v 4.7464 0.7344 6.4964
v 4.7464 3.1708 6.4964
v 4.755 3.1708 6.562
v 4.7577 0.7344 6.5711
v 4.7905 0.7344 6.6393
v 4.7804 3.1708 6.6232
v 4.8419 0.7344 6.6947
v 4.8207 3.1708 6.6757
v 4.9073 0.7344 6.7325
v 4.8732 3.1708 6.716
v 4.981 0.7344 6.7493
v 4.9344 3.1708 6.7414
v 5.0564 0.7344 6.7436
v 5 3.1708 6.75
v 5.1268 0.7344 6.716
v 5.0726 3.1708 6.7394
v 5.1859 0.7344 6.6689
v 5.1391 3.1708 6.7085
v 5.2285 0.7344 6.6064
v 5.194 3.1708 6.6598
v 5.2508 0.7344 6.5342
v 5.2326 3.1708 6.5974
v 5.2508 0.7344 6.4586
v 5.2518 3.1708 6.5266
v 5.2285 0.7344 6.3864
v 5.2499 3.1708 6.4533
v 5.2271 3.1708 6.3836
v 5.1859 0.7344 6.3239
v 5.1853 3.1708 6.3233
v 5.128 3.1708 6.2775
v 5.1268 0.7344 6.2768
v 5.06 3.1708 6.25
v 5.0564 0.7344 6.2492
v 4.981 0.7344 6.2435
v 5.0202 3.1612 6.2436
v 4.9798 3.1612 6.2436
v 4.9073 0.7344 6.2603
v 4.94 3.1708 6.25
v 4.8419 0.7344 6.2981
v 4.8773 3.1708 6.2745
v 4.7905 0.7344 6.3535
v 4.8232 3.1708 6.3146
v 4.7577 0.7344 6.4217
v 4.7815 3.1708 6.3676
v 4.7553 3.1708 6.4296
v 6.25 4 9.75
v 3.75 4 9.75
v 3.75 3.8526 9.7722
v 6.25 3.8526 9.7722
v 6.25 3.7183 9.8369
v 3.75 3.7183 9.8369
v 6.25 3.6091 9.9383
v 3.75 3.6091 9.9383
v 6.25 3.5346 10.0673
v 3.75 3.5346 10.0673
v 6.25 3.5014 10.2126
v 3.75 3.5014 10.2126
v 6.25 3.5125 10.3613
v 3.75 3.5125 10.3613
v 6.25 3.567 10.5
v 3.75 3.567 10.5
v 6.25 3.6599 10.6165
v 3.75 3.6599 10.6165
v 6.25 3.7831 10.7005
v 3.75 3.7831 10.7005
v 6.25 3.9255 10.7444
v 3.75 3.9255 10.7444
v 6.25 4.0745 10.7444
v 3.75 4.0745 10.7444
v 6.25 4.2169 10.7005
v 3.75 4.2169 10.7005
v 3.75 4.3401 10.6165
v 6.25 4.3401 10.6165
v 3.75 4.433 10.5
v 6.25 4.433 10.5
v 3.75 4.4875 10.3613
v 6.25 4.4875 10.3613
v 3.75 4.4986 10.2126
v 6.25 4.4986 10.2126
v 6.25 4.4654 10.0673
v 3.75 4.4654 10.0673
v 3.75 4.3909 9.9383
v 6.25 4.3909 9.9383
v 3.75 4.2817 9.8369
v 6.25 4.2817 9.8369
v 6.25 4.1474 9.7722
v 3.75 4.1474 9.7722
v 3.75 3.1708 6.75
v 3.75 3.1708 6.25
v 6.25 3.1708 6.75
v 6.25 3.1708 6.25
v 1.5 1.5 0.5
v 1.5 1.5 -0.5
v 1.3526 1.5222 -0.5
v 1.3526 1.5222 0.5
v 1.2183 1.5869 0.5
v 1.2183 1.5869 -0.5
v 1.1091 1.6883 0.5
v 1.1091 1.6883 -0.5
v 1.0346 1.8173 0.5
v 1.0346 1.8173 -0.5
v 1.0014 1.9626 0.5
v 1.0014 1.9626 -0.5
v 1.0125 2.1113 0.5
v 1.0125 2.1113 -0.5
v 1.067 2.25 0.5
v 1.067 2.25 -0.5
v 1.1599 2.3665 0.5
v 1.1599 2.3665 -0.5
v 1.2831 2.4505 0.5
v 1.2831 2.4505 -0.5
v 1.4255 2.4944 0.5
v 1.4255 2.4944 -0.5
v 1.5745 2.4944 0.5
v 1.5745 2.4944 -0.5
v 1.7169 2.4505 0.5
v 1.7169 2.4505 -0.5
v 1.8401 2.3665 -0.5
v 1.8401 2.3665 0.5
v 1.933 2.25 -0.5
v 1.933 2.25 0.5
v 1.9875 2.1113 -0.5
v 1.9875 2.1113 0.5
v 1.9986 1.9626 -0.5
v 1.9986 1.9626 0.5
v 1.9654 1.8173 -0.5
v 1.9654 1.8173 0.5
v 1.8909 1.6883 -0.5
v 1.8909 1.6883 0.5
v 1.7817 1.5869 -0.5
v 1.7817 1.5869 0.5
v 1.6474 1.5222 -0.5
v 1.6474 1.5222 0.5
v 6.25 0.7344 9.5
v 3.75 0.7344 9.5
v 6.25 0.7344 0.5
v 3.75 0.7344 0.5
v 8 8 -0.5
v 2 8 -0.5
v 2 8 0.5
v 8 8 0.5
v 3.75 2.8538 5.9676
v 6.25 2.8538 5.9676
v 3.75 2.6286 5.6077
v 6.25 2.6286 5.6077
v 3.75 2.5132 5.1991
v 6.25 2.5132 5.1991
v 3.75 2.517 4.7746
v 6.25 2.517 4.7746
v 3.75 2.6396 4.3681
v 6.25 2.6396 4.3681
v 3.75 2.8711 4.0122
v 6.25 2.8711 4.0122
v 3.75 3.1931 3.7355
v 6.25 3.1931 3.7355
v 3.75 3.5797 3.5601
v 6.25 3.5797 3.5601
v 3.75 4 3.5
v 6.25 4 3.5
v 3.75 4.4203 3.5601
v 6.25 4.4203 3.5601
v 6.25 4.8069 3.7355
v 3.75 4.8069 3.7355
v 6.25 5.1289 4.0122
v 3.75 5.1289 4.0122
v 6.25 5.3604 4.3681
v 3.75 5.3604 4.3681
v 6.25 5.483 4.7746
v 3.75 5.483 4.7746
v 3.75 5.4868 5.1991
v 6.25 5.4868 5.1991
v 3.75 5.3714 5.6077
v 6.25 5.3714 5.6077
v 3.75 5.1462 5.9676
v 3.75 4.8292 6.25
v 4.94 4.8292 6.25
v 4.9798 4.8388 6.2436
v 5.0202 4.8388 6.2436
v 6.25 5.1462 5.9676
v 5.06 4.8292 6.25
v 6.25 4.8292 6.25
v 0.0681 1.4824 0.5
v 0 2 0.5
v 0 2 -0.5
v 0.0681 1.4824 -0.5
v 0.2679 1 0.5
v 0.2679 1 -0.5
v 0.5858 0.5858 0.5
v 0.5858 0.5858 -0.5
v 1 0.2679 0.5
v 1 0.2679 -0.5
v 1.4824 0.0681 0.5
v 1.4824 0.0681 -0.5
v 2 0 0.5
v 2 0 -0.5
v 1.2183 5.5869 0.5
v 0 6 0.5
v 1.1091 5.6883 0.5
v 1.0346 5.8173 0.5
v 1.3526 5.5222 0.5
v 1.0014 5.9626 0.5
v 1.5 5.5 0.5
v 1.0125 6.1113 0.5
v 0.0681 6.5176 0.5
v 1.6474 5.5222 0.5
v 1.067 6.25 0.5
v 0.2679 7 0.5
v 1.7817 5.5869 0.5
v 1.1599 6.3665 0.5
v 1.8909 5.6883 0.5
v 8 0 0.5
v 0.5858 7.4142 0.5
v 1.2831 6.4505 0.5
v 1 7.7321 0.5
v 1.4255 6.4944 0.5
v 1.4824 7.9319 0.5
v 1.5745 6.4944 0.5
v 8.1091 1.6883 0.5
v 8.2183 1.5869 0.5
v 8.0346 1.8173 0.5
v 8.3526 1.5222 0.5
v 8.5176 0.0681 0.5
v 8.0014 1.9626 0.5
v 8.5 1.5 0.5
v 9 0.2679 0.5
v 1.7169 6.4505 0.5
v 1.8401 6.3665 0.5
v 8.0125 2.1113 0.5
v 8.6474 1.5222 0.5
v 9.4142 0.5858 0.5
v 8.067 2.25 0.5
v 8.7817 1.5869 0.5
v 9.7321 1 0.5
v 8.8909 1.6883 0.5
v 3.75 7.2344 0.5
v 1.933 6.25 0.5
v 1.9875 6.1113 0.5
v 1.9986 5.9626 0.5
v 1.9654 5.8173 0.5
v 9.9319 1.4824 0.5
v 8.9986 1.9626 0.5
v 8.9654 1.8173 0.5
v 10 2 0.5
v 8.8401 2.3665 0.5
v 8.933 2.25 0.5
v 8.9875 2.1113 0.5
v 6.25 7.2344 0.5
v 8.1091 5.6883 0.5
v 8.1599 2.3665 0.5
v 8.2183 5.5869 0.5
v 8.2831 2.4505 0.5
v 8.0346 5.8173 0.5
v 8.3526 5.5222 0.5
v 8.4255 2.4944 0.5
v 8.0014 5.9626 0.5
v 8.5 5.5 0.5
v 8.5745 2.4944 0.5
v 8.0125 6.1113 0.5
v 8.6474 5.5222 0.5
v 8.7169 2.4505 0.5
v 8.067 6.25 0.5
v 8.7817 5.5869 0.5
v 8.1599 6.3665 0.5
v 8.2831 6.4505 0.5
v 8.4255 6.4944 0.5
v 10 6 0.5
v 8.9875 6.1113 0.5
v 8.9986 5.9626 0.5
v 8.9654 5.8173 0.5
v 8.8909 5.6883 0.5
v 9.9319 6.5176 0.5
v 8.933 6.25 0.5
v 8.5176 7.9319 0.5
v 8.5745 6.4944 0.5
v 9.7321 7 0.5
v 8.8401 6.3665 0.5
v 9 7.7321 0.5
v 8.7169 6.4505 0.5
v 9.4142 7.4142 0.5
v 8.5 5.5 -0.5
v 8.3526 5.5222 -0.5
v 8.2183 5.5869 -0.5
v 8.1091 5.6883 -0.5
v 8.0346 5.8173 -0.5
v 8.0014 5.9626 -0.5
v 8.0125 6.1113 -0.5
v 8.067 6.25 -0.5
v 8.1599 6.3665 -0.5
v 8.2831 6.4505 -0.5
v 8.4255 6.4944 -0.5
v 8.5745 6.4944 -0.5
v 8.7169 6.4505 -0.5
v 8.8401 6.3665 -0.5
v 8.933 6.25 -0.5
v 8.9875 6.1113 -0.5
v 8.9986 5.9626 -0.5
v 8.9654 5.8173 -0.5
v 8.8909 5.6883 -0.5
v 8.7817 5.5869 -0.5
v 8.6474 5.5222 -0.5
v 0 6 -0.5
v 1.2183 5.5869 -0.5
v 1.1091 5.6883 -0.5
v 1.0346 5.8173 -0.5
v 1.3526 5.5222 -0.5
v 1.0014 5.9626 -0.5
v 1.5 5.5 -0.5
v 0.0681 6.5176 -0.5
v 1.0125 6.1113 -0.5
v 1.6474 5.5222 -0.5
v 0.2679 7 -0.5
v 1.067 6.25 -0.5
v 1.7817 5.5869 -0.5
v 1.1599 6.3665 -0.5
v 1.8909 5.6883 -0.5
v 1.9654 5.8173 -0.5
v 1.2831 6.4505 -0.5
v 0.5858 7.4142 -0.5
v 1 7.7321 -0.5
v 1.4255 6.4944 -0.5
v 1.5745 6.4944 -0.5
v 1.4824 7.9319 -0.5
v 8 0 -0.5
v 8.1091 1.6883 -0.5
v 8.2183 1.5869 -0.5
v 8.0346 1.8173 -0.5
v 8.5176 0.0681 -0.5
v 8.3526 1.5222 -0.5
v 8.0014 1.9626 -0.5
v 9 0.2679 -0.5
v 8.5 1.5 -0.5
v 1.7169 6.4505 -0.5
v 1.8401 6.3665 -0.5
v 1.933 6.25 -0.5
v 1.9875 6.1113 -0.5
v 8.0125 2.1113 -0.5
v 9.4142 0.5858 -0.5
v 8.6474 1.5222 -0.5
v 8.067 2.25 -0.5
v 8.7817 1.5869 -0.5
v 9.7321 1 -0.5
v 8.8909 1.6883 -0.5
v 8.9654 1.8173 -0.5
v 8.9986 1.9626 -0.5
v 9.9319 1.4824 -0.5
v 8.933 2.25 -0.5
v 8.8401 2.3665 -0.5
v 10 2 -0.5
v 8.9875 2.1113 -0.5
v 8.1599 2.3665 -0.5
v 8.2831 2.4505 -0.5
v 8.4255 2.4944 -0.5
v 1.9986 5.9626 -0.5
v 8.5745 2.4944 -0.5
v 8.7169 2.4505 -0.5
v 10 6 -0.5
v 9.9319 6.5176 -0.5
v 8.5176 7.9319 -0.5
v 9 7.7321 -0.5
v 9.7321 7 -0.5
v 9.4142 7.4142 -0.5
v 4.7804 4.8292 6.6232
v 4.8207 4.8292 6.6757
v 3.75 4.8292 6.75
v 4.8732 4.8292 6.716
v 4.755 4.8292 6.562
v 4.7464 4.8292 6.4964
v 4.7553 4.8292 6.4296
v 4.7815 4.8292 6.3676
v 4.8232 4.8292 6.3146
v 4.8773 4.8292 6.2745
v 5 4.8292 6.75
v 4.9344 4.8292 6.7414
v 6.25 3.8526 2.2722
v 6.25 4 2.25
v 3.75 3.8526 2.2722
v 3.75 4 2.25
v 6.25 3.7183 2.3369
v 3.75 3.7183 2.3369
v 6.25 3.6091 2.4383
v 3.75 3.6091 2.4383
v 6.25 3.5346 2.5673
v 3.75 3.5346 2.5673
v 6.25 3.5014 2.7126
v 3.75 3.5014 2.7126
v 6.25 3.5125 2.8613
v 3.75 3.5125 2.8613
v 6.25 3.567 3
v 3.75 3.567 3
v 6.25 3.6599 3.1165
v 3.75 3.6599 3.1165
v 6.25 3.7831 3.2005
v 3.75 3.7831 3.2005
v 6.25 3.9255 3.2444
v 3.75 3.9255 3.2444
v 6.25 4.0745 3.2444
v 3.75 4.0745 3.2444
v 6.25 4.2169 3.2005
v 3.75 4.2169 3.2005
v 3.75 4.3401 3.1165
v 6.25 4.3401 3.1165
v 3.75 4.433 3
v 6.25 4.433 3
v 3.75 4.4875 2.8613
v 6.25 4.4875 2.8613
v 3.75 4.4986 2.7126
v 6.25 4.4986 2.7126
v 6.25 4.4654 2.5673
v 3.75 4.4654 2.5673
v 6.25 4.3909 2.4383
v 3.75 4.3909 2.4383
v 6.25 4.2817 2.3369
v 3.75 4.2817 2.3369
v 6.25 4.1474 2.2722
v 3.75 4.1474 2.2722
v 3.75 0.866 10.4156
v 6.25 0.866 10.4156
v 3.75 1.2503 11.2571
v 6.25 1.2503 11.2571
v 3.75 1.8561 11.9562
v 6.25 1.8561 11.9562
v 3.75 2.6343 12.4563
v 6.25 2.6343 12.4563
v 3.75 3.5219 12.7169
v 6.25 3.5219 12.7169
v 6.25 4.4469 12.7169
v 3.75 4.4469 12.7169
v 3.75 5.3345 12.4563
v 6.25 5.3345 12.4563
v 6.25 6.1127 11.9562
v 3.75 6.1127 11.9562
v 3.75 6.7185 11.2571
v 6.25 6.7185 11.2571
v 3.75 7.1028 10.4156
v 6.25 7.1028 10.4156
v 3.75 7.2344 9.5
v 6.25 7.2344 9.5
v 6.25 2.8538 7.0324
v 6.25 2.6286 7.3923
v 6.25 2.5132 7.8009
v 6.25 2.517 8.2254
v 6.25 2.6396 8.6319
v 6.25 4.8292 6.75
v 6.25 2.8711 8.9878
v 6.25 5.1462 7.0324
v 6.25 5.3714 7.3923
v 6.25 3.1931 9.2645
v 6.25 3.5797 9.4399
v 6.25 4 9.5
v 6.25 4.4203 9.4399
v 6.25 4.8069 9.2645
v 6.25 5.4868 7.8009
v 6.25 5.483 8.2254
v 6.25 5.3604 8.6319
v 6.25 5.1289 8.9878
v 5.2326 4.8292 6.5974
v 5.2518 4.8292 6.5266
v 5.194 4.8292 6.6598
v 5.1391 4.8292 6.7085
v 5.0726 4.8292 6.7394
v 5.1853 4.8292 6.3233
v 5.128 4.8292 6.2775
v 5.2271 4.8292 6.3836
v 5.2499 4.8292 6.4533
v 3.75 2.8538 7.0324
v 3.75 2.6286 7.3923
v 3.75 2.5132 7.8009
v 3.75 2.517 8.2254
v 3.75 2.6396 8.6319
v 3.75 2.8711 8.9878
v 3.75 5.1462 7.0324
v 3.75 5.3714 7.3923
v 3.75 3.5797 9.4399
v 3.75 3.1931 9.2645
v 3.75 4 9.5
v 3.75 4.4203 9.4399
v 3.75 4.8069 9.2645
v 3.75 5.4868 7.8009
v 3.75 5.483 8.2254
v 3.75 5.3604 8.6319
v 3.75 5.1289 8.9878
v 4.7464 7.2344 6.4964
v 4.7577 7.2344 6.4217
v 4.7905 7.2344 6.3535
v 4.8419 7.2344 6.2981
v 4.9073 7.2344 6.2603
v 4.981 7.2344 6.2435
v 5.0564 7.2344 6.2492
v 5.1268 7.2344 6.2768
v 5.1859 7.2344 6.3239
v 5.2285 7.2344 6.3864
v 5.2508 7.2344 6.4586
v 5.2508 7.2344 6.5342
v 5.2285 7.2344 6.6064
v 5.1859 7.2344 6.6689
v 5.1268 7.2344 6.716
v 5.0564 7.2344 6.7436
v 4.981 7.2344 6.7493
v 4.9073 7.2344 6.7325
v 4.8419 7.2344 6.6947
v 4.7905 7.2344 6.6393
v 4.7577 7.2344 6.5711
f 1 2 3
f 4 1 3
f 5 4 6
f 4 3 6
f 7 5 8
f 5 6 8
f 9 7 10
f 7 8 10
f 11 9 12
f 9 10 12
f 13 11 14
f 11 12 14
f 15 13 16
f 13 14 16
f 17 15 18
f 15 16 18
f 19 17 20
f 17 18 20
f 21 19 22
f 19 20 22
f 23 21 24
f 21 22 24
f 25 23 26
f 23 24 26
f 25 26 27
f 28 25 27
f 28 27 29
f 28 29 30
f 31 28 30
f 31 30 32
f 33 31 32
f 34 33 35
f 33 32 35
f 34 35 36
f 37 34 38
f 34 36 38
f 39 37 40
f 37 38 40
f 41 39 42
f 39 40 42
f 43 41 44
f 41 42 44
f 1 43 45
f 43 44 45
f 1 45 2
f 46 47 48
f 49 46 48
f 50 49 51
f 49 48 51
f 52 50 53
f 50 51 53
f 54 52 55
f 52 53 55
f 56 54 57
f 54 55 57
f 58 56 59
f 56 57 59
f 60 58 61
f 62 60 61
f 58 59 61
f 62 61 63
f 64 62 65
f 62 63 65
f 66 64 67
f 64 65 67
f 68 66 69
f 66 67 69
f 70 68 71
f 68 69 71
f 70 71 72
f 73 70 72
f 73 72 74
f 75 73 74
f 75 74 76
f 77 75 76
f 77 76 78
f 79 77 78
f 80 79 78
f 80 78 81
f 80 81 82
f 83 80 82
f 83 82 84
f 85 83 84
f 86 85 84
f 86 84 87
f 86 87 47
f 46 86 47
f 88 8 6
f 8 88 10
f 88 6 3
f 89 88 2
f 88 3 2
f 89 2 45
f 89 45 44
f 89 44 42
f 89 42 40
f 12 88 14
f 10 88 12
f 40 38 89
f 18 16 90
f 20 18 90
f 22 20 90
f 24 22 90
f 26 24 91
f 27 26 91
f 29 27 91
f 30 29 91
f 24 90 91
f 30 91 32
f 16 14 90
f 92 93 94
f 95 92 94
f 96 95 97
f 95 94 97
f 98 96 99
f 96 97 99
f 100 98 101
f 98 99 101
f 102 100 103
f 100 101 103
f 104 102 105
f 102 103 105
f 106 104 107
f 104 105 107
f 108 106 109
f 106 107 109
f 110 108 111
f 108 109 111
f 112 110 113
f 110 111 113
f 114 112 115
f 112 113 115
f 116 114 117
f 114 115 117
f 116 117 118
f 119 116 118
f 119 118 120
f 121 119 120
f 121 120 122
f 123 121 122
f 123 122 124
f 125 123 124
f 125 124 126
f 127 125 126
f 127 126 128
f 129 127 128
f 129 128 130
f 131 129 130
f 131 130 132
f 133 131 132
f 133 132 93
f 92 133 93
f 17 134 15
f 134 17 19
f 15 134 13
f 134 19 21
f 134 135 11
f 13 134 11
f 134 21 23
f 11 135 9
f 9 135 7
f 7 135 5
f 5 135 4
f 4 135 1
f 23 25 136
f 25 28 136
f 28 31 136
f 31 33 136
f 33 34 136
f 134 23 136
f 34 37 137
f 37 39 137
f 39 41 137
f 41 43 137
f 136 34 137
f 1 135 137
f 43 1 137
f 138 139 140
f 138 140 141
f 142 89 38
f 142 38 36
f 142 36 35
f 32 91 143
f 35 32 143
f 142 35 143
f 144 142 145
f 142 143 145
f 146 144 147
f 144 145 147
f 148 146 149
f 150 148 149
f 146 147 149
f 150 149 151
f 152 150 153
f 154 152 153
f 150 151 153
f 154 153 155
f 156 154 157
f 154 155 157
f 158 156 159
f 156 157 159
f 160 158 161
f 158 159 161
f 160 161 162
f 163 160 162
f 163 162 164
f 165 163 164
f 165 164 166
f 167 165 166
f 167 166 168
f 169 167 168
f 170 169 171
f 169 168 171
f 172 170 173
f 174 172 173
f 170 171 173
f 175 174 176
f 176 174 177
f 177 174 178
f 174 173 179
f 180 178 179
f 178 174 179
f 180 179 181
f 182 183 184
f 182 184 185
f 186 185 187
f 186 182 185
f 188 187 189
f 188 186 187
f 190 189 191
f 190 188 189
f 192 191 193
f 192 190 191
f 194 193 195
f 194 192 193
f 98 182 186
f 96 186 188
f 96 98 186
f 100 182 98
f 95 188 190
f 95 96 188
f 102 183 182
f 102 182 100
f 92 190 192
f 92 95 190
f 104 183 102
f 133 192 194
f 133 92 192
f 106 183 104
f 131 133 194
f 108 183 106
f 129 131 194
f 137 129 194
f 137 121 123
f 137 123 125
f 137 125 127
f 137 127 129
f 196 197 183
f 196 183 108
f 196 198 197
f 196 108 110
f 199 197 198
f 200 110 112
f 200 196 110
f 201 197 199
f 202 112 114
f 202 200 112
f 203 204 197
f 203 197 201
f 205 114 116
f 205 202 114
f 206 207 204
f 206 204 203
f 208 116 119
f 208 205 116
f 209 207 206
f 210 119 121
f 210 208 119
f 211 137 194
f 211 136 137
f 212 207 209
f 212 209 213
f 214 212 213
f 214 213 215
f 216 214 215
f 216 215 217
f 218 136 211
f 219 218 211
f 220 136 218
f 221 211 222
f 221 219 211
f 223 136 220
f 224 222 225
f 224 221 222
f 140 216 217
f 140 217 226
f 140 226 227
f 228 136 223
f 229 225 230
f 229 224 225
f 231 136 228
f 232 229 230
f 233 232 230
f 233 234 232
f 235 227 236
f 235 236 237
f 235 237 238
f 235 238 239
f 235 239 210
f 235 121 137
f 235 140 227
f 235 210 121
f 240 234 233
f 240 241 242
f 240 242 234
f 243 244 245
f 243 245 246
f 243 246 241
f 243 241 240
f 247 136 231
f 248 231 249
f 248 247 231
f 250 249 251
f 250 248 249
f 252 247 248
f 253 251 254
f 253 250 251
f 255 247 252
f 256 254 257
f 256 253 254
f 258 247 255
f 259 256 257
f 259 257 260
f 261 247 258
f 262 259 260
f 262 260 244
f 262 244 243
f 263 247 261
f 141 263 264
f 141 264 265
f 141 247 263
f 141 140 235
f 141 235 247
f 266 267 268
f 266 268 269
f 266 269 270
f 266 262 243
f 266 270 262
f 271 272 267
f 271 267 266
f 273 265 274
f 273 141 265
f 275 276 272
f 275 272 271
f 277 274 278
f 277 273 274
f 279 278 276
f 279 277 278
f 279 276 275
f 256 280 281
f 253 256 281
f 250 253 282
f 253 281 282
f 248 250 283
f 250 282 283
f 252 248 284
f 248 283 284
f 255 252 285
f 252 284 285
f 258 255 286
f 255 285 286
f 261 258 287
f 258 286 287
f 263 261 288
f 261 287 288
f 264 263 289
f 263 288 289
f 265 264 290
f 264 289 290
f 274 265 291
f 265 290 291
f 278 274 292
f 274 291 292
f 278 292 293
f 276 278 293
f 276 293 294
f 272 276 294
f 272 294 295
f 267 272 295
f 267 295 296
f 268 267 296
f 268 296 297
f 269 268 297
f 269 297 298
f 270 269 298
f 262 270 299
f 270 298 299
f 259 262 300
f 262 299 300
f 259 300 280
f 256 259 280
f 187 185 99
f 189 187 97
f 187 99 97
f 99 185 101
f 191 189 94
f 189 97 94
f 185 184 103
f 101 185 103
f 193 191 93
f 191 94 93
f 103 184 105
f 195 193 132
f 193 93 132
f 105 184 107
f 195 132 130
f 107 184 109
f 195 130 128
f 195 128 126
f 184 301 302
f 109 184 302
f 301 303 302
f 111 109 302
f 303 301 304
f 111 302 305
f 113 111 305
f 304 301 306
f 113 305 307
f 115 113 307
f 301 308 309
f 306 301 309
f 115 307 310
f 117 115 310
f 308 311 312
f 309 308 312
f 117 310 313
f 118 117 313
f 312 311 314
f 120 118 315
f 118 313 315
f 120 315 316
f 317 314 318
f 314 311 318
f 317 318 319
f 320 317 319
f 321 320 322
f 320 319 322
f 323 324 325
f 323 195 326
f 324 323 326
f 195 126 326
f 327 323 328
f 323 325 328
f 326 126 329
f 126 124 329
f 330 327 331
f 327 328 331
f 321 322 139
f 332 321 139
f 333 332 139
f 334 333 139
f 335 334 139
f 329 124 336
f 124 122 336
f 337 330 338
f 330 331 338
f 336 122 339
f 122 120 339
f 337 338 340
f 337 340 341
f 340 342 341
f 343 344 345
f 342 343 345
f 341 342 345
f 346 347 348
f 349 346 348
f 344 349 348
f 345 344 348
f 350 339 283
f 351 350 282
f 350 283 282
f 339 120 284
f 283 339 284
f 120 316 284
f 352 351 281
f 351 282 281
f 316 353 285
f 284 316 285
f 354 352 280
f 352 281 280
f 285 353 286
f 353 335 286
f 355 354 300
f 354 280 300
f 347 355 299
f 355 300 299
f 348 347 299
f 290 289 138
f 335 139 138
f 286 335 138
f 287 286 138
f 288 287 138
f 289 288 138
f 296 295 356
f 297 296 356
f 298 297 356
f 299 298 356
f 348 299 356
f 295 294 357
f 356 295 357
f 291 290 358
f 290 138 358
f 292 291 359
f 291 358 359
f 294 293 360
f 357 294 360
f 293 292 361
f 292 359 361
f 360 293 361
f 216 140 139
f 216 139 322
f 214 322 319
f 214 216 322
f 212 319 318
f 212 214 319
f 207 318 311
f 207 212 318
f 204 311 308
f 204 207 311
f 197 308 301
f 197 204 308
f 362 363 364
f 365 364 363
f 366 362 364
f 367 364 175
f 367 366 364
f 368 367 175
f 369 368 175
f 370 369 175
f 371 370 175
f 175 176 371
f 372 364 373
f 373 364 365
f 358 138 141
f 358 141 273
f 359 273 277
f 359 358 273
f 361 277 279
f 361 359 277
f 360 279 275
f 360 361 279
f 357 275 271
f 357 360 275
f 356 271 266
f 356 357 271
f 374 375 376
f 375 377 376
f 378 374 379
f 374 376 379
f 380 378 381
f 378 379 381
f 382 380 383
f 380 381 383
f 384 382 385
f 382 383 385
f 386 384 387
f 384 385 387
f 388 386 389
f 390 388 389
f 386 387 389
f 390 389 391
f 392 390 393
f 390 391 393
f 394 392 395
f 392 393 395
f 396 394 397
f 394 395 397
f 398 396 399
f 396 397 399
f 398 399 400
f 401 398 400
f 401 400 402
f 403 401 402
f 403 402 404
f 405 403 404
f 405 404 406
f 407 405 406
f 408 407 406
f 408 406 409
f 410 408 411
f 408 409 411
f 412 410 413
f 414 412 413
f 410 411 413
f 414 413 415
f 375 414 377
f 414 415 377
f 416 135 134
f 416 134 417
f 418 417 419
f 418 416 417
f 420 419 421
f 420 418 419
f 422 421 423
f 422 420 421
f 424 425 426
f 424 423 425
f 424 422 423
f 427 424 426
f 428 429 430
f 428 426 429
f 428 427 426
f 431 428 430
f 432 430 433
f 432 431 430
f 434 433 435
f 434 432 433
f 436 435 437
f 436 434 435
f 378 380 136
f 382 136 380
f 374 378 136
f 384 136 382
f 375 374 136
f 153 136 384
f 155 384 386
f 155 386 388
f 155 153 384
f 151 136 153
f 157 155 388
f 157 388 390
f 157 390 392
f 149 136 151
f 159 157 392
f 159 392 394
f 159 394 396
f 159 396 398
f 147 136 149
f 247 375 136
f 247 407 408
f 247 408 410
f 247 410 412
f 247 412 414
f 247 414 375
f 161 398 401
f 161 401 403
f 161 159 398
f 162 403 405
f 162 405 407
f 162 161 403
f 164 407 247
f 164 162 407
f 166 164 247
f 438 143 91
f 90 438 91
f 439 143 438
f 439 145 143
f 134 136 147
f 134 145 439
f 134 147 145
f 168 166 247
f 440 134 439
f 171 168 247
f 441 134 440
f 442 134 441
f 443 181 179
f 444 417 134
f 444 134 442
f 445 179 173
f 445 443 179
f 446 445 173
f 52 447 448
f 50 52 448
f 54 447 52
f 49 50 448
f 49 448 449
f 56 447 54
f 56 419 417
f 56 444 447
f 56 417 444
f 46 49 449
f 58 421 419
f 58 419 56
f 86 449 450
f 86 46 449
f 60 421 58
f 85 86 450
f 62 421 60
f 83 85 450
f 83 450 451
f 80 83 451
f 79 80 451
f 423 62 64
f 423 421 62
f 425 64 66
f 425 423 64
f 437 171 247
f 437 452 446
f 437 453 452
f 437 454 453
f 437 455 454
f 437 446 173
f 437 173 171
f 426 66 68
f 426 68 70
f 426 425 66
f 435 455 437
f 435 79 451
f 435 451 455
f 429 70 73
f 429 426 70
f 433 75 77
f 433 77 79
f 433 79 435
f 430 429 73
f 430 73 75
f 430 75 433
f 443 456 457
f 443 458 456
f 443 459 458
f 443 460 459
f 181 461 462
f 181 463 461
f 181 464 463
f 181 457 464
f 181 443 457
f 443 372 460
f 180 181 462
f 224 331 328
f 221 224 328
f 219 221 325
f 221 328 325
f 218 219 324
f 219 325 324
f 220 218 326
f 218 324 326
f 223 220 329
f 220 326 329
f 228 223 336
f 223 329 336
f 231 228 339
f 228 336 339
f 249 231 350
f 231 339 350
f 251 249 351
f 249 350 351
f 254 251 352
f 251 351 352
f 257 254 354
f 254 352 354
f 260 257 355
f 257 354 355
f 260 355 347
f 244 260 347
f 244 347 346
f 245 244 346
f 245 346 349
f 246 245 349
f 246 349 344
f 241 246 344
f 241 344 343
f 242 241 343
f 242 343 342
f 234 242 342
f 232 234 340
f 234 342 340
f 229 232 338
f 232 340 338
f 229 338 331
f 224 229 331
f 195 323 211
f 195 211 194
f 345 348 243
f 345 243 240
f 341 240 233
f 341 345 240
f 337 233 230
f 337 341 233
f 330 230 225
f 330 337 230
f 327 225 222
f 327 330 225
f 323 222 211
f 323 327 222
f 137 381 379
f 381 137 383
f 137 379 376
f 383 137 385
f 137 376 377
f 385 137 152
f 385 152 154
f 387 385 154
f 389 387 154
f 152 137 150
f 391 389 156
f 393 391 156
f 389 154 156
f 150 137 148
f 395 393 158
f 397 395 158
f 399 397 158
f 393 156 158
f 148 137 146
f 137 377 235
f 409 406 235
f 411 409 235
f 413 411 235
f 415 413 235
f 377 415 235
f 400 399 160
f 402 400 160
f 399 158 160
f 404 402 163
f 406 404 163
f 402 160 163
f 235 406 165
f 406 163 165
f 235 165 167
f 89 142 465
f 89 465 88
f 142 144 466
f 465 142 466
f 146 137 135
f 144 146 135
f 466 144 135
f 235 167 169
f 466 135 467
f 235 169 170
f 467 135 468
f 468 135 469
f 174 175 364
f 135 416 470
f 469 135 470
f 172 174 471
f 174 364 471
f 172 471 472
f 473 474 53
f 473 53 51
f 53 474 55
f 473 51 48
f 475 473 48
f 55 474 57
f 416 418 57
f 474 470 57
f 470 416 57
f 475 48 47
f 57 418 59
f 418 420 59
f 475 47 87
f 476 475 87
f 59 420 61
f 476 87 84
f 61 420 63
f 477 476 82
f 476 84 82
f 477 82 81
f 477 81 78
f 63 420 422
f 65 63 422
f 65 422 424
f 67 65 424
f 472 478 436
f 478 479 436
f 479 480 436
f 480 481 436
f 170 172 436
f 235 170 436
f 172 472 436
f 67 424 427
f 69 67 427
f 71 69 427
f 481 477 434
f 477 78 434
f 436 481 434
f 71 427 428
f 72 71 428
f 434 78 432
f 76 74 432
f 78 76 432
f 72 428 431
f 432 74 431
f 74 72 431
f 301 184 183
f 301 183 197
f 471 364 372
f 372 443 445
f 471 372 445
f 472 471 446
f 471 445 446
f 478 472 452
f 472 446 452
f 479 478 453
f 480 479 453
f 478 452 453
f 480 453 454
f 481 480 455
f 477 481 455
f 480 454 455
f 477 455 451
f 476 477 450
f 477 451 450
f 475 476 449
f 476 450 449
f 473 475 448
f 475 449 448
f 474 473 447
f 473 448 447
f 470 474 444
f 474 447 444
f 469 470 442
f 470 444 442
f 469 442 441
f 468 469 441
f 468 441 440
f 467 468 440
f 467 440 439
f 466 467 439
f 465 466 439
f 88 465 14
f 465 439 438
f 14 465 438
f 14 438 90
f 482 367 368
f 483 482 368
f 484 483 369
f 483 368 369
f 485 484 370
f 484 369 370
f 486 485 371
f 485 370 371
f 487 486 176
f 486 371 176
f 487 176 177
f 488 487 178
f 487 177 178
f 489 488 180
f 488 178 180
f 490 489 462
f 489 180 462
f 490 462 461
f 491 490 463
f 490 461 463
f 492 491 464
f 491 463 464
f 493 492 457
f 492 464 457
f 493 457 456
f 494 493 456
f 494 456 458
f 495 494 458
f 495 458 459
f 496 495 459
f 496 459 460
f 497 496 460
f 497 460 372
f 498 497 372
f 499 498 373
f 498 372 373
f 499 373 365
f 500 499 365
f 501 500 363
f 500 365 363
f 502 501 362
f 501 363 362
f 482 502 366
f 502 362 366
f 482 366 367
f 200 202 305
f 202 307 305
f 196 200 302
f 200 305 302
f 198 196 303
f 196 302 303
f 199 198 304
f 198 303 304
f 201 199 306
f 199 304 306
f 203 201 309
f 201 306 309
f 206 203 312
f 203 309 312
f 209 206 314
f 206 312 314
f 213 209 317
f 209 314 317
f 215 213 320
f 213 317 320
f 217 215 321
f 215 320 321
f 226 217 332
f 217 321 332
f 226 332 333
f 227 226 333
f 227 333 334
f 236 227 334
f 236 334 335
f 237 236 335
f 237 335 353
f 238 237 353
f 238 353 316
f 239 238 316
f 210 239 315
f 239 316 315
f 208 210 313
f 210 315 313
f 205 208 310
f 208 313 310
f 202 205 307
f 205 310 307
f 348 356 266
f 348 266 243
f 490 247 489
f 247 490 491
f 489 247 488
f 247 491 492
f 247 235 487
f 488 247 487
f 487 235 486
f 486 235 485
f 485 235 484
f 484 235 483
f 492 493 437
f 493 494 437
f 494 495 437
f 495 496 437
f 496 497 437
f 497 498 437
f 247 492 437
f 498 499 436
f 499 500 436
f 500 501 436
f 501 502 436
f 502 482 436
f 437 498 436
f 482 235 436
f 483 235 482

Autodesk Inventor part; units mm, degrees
ref_plane "XY Plane" through (0, 0, 0) normal (0, 0, 1) x (1, 0, 0)
sketch "Skizze1" plane through (0, 0, 0) normal (0, 0, 1) x (1, 0, 0)
  line L0 (0, 8) -> (10, 8)
  line L1 (10, 8) -> (10, 0)
  line L2 (10, 0) -> (0, 0)
  line L3 (0, 0) -> (0, 8)
  dimension "d0" = 8
  dimension "d1" = 10
extrude "Extrusion1" add sketch "Skizze1" along normal mid plane 1
ref_plane "Arbeitsebene2" through (5, 0, 0) normal (1, 0, 0) x (0, 1, 0)
sketch "Skizze3" plane through (5, 0, 0) normal (1, 0, 0) x (0, 1, 0)
  line L0 (8, 0.5) -> (0, 0.5) projected
  line L1 (0.7344, 0.5) -> (7.2344, 0.5)
  line L2 (7.2344, 0.5) -> (7.2344, 9.5)
  line L3 (0.7344, 9.5) -> (0.7344, 0.5)
  arc A0 (7.2344, 9.5) -> (0.7344, 9.5) centre (3.9844, 9.5) ccw
  line L4 (0, -0.5) -> (8, -0.5) projected
  point P0 (0, 0)
  point P1 (3.9844, -0.5)
  dimension "d5" = 6.5
  dimension "d6" = 10
extrude "Extrusion2" add sketch "Skizze3" along normal mid plane 2.5
sketch "Skizze4" plane through (6.25, 0, 0) normal (1, 0, 0) x (0, 0, -1)
  line L0 (-6.75, 3.1708) -> (-6.25, 3.1708)
  line L1 (-6.75, 4.8292) -> (-6.25, 4.8292)
  arc A0 (-6.75, 4.8292) -> (-6.75, 3.1708) centre (-8, 4) ccw
  arc A1 (-6.25, 3.1708) -> (-6.25, 4.8292) centre (-5, 4) ccw
  line L2 (-0.5, 0) -> (-0.5, 8) projected
  point P0 (0, 0)
  point P1 (-0.5, 4)
  dimension "d9" = 1.5
  dimension "d10" = 0.5
  dimension "d11" = 4.5
  dimension "d12" = 3
extrude "Extrusion3" cut sketch "Skizze4" against normal blind 2.5
sketch "Skizze5" plane through (6.25, 0, 0) normal (1, 0, 0) x (0, 0, -1)
  arc A0 (-6.25, 3.1708) -> (-6.25, 4.8292) centre (-5, 4) ccw projected
  point P0 (0, 0)
  point P1 (-2.75, 4)
  point P2 (-3.5, 4)
  point P3 (-3.5, 4)
  dimension "d15" = 0.75
hole "Bohrung1" at (6.25, 4, 2.75) direction (-1, 0, 0) diameter 1 end through all
sketch "Skizze6" plane through (6.25, 0, 0) normal (1, 0, 0) x (0, 0, -1)
  arc A0 (-6.75, 4.8292) -> (-6.75, 3.1708) centre (-8, 4) ccw projected
  point P0 (0, 0)
  point P1 (-10.25, 4)
  point P2 (-9.5, 4)
  point P3 (-9.5, 4)
  dimension "d23" = 0.75
hole "Bohrung2" at (6.25, 4, 10.25) direction (-1, 0, 0) diameter 1 end through all
ref_plane "Arbeitsebene3" through (0, 4, 0) normal (0, 1, 0) x (-1, 0, 0)
sketch "Skizze7" plane through (0, 4, 0) normal (0, 1, 0) x (-1, 0, 0)
  circle A0 centre (-5, 6.4964) radius 0.2536
  line L0 (-6.25, 6.75) -> (-3.75, 6.75) projected
  point P0 (0, 0)
  point P1 (-5, 6.75)
  dimension "d32" = 0.5072
extrude "Extrusion4" cut sketch "Skizze7" along normal through all both and the other way through all
fillet "Rundung1" radius 2 4 edges at (10, 8, 0) (10, 0, 0) (0, 8, 0) (0, 0, 0)
sketch "Skizze8" plane through (0, 0, 0.5) normal (0, 0, 1) x (1, 0, 0)
  line L0 (10, 2) -> (10, 6) projected
  line L1 (10, 4) -> (0, 4) construction
  line L2 (2, 0) -> (8, 0) projected
  line L3 (5, 0) -> (5, 8) construction
  line L4 (2, 8) -> (8, 8) projected
  point P0 (0, 0)
  point P1 (8.5, 2)
  point P2 (1.5, 2)
  point P3 (1.5, 6)
  point P4 (8.5, 6)
  dimension "d36" = 7
  dimension "d37" = 4
hole "Bohrung3" at (8.5, 2, 0.5) at (1.5, 2, 0.5) at (1.5, 6, 0.5) at (8.5, 6, 0.5) direction (0, 0, -1) diameter 1 end through all
properties part number "grave" material "Stahl, galvanisiert"
